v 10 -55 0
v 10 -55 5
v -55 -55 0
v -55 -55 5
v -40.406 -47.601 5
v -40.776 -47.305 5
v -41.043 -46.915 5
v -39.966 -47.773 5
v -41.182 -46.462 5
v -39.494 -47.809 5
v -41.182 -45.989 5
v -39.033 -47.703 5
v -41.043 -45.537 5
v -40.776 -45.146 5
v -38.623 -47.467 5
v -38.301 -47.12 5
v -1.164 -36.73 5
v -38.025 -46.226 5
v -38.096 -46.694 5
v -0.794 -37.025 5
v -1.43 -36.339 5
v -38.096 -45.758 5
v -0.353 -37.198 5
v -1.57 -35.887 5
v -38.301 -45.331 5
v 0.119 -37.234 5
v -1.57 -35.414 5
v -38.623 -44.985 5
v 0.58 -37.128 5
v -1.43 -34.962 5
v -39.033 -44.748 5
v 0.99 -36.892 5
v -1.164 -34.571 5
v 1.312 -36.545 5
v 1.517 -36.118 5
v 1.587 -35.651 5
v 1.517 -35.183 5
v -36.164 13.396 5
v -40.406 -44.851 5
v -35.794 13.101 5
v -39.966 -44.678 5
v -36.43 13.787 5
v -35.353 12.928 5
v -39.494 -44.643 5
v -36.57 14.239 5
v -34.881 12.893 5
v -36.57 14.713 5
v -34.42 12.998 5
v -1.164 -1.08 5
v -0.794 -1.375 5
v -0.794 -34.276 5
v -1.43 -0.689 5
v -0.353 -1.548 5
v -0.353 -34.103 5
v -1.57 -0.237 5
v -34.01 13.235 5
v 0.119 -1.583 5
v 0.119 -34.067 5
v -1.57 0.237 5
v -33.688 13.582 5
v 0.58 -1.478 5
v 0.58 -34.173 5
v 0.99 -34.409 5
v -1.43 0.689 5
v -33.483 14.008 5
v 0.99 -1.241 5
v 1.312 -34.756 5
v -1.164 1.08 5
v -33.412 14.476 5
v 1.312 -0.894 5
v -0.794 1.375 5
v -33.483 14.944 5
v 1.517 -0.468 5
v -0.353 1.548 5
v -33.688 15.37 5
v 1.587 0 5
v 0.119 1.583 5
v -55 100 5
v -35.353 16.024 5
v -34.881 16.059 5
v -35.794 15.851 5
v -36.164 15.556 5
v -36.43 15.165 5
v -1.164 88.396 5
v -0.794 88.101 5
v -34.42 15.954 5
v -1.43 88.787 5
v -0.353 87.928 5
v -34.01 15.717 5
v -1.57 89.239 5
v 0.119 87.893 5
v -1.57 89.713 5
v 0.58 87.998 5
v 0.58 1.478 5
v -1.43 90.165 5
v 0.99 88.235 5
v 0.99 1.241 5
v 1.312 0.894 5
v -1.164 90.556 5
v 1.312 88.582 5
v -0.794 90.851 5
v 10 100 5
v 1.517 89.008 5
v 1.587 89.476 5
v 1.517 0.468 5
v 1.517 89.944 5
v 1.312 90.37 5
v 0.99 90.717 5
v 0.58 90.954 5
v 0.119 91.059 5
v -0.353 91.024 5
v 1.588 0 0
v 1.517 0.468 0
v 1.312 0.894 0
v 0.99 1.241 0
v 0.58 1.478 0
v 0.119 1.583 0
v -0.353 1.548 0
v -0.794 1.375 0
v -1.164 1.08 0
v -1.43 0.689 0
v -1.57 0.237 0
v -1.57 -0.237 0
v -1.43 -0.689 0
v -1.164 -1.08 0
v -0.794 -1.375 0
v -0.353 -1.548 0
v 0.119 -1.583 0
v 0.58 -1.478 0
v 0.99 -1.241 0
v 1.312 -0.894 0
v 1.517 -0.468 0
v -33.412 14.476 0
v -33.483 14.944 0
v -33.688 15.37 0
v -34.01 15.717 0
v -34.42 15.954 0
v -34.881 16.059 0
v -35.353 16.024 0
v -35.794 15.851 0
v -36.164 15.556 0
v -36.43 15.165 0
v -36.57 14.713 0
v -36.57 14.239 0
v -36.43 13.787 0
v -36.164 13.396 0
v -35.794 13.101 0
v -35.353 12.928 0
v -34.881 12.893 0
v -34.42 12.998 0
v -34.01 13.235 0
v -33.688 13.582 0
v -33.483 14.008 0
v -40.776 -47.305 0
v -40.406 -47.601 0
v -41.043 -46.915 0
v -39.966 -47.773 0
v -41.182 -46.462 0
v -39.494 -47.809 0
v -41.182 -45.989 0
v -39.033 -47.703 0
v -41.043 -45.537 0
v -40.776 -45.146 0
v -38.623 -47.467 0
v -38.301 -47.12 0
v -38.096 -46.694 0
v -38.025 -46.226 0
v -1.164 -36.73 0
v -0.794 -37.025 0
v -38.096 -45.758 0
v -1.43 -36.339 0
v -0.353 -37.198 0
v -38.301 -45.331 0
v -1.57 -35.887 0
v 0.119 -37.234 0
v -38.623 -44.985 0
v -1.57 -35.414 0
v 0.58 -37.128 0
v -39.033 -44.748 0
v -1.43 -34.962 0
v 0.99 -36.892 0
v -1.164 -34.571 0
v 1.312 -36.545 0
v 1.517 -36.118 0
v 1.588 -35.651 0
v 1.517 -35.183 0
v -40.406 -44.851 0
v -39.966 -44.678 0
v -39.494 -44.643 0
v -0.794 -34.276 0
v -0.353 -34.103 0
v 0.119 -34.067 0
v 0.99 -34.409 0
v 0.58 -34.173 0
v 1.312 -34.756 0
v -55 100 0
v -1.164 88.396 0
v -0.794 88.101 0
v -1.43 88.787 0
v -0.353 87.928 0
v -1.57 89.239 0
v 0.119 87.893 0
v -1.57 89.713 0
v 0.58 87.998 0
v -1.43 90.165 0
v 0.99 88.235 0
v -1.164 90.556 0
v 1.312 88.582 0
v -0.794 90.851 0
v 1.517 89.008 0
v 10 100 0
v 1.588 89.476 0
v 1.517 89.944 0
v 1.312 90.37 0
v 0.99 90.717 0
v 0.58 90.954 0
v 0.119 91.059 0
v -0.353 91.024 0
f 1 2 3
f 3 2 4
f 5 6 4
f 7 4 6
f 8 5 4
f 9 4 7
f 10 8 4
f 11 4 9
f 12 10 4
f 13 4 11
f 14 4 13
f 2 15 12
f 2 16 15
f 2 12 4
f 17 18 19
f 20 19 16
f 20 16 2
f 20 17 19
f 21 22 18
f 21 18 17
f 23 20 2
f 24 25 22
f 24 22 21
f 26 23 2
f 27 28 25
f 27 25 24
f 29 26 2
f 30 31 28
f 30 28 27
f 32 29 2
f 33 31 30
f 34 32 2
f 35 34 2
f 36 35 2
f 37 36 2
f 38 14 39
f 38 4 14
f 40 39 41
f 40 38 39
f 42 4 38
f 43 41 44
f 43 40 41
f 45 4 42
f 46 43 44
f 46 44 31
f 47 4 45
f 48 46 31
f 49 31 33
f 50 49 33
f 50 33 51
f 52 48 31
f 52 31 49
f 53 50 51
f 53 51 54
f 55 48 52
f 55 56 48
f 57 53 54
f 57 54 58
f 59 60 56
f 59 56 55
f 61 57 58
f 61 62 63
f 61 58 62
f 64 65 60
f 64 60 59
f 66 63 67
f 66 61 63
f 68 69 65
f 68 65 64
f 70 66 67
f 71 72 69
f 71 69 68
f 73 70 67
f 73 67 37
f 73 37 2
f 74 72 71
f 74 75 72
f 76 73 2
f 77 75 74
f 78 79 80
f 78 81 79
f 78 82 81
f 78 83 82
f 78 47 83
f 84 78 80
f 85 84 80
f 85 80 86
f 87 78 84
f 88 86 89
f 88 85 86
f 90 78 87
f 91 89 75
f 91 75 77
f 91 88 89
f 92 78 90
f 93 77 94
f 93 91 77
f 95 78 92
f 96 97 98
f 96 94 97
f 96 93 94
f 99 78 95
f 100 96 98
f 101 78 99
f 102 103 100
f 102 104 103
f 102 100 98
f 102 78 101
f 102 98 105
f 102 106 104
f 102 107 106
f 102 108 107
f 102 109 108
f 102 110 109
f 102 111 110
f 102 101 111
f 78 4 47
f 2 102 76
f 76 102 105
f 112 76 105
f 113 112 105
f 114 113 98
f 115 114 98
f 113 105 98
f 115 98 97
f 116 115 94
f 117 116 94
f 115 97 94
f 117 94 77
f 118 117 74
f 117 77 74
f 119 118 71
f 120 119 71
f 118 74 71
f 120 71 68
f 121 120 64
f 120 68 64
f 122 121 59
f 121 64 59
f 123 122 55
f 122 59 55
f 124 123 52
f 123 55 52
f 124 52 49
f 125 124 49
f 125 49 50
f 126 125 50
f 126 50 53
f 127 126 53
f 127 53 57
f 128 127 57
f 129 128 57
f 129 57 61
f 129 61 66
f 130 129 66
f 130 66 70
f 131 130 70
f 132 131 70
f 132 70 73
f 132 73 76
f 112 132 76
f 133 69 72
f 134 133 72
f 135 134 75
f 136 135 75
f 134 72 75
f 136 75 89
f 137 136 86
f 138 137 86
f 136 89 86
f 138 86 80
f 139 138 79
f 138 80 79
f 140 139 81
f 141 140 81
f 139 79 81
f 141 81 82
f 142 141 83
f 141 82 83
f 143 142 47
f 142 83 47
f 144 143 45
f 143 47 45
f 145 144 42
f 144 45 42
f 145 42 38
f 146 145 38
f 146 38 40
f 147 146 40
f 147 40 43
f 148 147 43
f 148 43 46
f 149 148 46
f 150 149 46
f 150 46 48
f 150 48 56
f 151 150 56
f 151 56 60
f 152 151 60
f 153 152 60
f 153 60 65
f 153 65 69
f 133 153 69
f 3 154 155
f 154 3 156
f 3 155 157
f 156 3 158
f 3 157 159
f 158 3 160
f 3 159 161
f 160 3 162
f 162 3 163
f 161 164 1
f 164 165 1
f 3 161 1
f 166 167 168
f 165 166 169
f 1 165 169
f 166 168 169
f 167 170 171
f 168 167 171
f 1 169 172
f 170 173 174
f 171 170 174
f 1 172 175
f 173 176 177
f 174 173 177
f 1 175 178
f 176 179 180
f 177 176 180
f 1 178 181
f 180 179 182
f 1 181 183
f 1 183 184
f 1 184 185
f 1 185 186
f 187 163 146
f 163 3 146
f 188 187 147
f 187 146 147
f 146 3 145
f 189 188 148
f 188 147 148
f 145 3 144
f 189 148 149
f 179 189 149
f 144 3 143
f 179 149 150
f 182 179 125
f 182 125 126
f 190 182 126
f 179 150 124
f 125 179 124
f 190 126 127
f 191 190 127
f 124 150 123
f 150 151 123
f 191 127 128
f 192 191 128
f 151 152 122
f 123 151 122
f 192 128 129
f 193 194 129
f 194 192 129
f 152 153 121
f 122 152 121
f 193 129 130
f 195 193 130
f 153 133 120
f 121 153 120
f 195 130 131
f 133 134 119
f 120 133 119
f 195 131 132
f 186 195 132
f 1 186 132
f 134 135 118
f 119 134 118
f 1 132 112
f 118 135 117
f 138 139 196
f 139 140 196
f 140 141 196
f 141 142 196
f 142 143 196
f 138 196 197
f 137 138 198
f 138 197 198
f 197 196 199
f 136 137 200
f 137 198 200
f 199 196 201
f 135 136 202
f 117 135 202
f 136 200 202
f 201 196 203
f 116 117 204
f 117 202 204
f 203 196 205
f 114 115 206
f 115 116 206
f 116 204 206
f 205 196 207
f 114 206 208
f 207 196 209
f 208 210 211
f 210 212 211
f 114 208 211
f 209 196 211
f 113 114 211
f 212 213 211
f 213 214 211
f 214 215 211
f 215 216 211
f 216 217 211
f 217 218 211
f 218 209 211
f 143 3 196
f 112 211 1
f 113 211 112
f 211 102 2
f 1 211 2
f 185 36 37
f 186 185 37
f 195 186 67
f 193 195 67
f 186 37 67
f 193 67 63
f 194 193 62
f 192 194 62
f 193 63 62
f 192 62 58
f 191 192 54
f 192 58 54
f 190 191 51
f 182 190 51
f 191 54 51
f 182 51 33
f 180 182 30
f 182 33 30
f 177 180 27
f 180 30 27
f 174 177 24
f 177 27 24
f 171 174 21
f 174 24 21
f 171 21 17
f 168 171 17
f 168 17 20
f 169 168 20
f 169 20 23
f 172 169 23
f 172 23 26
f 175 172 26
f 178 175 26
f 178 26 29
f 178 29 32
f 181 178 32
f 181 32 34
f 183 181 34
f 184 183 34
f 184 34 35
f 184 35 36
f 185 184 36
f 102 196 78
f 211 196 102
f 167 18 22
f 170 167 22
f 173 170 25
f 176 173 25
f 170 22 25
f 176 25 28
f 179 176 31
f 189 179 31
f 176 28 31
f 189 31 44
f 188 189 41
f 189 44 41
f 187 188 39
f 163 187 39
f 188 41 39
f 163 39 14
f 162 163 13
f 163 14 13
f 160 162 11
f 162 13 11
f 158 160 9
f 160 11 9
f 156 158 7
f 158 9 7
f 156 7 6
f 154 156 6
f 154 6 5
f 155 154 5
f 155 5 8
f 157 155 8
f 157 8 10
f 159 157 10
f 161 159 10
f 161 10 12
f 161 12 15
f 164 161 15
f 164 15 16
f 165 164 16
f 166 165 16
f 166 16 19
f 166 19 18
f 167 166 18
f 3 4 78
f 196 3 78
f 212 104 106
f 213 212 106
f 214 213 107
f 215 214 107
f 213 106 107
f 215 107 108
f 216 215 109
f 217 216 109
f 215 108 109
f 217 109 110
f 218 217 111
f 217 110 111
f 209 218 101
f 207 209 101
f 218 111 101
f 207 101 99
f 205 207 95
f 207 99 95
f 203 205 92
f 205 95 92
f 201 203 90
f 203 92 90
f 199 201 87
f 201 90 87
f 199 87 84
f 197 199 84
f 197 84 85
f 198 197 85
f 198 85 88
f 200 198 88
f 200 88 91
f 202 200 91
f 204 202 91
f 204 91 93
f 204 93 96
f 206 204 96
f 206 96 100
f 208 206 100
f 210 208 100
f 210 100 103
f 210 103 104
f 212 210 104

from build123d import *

# Parameters (mm, degrees)
F0_W     = 200
F0_H     = 200
F1_DEPTH = 5
F2_R     = 1.5875
F3_DEPTH = 5.001
F4_R     = 1.5875
F5_DEPTH = 25


with BuildPart() as f1:
    # F0 (on Top) → F1 (new body)
    with BuildSketch(Plane.XY):
        Rectangle(F0_W, F0_H)
    extrude(amount=F1_DEPTH)

    # F2 (on face) → F3 (cut, through all)
    with BuildSketch(Plane.XY.offset(5)):
        Circle(F2_R)
        with Locations((0, -35.65053)):
            Circle(F2_R)
        with Locations((-39.612573, -46.225714)):
            Circle(F2_R)
        with Locations((-35, 14.476054)):
            Circle(F2_R)
        with Locations((0, 89.476054)):
            Circle(F2_R)
    extrude(amount=-F3_DEPTH, mode=Mode.SUBTRACT)

    # F4 (on face) → F5 (cut)
    with BuildSketch(Plane.XY.offset(5)):
        Polygon((-55, -55), (-55, 100), (-100, 100), (-100, -100), (100, -100), (100, 100), (10, 100), (10, -55), align=None)
        Circle(F4_R)
        with Locations((0, -35.65053)):
            Circle(F4_R)
        with Locations((-39.612573, -46.225714)):
            Circle(F4_R)
        with Locations((-35, 14.476054)):
            Circle(F4_R)
        with Locations((0, 89.476054)):
            Circle(F4_R)
    extrude(amount=-F5_DEPTH, mode=Mode.SUBTRACT)


solid = f1.part
